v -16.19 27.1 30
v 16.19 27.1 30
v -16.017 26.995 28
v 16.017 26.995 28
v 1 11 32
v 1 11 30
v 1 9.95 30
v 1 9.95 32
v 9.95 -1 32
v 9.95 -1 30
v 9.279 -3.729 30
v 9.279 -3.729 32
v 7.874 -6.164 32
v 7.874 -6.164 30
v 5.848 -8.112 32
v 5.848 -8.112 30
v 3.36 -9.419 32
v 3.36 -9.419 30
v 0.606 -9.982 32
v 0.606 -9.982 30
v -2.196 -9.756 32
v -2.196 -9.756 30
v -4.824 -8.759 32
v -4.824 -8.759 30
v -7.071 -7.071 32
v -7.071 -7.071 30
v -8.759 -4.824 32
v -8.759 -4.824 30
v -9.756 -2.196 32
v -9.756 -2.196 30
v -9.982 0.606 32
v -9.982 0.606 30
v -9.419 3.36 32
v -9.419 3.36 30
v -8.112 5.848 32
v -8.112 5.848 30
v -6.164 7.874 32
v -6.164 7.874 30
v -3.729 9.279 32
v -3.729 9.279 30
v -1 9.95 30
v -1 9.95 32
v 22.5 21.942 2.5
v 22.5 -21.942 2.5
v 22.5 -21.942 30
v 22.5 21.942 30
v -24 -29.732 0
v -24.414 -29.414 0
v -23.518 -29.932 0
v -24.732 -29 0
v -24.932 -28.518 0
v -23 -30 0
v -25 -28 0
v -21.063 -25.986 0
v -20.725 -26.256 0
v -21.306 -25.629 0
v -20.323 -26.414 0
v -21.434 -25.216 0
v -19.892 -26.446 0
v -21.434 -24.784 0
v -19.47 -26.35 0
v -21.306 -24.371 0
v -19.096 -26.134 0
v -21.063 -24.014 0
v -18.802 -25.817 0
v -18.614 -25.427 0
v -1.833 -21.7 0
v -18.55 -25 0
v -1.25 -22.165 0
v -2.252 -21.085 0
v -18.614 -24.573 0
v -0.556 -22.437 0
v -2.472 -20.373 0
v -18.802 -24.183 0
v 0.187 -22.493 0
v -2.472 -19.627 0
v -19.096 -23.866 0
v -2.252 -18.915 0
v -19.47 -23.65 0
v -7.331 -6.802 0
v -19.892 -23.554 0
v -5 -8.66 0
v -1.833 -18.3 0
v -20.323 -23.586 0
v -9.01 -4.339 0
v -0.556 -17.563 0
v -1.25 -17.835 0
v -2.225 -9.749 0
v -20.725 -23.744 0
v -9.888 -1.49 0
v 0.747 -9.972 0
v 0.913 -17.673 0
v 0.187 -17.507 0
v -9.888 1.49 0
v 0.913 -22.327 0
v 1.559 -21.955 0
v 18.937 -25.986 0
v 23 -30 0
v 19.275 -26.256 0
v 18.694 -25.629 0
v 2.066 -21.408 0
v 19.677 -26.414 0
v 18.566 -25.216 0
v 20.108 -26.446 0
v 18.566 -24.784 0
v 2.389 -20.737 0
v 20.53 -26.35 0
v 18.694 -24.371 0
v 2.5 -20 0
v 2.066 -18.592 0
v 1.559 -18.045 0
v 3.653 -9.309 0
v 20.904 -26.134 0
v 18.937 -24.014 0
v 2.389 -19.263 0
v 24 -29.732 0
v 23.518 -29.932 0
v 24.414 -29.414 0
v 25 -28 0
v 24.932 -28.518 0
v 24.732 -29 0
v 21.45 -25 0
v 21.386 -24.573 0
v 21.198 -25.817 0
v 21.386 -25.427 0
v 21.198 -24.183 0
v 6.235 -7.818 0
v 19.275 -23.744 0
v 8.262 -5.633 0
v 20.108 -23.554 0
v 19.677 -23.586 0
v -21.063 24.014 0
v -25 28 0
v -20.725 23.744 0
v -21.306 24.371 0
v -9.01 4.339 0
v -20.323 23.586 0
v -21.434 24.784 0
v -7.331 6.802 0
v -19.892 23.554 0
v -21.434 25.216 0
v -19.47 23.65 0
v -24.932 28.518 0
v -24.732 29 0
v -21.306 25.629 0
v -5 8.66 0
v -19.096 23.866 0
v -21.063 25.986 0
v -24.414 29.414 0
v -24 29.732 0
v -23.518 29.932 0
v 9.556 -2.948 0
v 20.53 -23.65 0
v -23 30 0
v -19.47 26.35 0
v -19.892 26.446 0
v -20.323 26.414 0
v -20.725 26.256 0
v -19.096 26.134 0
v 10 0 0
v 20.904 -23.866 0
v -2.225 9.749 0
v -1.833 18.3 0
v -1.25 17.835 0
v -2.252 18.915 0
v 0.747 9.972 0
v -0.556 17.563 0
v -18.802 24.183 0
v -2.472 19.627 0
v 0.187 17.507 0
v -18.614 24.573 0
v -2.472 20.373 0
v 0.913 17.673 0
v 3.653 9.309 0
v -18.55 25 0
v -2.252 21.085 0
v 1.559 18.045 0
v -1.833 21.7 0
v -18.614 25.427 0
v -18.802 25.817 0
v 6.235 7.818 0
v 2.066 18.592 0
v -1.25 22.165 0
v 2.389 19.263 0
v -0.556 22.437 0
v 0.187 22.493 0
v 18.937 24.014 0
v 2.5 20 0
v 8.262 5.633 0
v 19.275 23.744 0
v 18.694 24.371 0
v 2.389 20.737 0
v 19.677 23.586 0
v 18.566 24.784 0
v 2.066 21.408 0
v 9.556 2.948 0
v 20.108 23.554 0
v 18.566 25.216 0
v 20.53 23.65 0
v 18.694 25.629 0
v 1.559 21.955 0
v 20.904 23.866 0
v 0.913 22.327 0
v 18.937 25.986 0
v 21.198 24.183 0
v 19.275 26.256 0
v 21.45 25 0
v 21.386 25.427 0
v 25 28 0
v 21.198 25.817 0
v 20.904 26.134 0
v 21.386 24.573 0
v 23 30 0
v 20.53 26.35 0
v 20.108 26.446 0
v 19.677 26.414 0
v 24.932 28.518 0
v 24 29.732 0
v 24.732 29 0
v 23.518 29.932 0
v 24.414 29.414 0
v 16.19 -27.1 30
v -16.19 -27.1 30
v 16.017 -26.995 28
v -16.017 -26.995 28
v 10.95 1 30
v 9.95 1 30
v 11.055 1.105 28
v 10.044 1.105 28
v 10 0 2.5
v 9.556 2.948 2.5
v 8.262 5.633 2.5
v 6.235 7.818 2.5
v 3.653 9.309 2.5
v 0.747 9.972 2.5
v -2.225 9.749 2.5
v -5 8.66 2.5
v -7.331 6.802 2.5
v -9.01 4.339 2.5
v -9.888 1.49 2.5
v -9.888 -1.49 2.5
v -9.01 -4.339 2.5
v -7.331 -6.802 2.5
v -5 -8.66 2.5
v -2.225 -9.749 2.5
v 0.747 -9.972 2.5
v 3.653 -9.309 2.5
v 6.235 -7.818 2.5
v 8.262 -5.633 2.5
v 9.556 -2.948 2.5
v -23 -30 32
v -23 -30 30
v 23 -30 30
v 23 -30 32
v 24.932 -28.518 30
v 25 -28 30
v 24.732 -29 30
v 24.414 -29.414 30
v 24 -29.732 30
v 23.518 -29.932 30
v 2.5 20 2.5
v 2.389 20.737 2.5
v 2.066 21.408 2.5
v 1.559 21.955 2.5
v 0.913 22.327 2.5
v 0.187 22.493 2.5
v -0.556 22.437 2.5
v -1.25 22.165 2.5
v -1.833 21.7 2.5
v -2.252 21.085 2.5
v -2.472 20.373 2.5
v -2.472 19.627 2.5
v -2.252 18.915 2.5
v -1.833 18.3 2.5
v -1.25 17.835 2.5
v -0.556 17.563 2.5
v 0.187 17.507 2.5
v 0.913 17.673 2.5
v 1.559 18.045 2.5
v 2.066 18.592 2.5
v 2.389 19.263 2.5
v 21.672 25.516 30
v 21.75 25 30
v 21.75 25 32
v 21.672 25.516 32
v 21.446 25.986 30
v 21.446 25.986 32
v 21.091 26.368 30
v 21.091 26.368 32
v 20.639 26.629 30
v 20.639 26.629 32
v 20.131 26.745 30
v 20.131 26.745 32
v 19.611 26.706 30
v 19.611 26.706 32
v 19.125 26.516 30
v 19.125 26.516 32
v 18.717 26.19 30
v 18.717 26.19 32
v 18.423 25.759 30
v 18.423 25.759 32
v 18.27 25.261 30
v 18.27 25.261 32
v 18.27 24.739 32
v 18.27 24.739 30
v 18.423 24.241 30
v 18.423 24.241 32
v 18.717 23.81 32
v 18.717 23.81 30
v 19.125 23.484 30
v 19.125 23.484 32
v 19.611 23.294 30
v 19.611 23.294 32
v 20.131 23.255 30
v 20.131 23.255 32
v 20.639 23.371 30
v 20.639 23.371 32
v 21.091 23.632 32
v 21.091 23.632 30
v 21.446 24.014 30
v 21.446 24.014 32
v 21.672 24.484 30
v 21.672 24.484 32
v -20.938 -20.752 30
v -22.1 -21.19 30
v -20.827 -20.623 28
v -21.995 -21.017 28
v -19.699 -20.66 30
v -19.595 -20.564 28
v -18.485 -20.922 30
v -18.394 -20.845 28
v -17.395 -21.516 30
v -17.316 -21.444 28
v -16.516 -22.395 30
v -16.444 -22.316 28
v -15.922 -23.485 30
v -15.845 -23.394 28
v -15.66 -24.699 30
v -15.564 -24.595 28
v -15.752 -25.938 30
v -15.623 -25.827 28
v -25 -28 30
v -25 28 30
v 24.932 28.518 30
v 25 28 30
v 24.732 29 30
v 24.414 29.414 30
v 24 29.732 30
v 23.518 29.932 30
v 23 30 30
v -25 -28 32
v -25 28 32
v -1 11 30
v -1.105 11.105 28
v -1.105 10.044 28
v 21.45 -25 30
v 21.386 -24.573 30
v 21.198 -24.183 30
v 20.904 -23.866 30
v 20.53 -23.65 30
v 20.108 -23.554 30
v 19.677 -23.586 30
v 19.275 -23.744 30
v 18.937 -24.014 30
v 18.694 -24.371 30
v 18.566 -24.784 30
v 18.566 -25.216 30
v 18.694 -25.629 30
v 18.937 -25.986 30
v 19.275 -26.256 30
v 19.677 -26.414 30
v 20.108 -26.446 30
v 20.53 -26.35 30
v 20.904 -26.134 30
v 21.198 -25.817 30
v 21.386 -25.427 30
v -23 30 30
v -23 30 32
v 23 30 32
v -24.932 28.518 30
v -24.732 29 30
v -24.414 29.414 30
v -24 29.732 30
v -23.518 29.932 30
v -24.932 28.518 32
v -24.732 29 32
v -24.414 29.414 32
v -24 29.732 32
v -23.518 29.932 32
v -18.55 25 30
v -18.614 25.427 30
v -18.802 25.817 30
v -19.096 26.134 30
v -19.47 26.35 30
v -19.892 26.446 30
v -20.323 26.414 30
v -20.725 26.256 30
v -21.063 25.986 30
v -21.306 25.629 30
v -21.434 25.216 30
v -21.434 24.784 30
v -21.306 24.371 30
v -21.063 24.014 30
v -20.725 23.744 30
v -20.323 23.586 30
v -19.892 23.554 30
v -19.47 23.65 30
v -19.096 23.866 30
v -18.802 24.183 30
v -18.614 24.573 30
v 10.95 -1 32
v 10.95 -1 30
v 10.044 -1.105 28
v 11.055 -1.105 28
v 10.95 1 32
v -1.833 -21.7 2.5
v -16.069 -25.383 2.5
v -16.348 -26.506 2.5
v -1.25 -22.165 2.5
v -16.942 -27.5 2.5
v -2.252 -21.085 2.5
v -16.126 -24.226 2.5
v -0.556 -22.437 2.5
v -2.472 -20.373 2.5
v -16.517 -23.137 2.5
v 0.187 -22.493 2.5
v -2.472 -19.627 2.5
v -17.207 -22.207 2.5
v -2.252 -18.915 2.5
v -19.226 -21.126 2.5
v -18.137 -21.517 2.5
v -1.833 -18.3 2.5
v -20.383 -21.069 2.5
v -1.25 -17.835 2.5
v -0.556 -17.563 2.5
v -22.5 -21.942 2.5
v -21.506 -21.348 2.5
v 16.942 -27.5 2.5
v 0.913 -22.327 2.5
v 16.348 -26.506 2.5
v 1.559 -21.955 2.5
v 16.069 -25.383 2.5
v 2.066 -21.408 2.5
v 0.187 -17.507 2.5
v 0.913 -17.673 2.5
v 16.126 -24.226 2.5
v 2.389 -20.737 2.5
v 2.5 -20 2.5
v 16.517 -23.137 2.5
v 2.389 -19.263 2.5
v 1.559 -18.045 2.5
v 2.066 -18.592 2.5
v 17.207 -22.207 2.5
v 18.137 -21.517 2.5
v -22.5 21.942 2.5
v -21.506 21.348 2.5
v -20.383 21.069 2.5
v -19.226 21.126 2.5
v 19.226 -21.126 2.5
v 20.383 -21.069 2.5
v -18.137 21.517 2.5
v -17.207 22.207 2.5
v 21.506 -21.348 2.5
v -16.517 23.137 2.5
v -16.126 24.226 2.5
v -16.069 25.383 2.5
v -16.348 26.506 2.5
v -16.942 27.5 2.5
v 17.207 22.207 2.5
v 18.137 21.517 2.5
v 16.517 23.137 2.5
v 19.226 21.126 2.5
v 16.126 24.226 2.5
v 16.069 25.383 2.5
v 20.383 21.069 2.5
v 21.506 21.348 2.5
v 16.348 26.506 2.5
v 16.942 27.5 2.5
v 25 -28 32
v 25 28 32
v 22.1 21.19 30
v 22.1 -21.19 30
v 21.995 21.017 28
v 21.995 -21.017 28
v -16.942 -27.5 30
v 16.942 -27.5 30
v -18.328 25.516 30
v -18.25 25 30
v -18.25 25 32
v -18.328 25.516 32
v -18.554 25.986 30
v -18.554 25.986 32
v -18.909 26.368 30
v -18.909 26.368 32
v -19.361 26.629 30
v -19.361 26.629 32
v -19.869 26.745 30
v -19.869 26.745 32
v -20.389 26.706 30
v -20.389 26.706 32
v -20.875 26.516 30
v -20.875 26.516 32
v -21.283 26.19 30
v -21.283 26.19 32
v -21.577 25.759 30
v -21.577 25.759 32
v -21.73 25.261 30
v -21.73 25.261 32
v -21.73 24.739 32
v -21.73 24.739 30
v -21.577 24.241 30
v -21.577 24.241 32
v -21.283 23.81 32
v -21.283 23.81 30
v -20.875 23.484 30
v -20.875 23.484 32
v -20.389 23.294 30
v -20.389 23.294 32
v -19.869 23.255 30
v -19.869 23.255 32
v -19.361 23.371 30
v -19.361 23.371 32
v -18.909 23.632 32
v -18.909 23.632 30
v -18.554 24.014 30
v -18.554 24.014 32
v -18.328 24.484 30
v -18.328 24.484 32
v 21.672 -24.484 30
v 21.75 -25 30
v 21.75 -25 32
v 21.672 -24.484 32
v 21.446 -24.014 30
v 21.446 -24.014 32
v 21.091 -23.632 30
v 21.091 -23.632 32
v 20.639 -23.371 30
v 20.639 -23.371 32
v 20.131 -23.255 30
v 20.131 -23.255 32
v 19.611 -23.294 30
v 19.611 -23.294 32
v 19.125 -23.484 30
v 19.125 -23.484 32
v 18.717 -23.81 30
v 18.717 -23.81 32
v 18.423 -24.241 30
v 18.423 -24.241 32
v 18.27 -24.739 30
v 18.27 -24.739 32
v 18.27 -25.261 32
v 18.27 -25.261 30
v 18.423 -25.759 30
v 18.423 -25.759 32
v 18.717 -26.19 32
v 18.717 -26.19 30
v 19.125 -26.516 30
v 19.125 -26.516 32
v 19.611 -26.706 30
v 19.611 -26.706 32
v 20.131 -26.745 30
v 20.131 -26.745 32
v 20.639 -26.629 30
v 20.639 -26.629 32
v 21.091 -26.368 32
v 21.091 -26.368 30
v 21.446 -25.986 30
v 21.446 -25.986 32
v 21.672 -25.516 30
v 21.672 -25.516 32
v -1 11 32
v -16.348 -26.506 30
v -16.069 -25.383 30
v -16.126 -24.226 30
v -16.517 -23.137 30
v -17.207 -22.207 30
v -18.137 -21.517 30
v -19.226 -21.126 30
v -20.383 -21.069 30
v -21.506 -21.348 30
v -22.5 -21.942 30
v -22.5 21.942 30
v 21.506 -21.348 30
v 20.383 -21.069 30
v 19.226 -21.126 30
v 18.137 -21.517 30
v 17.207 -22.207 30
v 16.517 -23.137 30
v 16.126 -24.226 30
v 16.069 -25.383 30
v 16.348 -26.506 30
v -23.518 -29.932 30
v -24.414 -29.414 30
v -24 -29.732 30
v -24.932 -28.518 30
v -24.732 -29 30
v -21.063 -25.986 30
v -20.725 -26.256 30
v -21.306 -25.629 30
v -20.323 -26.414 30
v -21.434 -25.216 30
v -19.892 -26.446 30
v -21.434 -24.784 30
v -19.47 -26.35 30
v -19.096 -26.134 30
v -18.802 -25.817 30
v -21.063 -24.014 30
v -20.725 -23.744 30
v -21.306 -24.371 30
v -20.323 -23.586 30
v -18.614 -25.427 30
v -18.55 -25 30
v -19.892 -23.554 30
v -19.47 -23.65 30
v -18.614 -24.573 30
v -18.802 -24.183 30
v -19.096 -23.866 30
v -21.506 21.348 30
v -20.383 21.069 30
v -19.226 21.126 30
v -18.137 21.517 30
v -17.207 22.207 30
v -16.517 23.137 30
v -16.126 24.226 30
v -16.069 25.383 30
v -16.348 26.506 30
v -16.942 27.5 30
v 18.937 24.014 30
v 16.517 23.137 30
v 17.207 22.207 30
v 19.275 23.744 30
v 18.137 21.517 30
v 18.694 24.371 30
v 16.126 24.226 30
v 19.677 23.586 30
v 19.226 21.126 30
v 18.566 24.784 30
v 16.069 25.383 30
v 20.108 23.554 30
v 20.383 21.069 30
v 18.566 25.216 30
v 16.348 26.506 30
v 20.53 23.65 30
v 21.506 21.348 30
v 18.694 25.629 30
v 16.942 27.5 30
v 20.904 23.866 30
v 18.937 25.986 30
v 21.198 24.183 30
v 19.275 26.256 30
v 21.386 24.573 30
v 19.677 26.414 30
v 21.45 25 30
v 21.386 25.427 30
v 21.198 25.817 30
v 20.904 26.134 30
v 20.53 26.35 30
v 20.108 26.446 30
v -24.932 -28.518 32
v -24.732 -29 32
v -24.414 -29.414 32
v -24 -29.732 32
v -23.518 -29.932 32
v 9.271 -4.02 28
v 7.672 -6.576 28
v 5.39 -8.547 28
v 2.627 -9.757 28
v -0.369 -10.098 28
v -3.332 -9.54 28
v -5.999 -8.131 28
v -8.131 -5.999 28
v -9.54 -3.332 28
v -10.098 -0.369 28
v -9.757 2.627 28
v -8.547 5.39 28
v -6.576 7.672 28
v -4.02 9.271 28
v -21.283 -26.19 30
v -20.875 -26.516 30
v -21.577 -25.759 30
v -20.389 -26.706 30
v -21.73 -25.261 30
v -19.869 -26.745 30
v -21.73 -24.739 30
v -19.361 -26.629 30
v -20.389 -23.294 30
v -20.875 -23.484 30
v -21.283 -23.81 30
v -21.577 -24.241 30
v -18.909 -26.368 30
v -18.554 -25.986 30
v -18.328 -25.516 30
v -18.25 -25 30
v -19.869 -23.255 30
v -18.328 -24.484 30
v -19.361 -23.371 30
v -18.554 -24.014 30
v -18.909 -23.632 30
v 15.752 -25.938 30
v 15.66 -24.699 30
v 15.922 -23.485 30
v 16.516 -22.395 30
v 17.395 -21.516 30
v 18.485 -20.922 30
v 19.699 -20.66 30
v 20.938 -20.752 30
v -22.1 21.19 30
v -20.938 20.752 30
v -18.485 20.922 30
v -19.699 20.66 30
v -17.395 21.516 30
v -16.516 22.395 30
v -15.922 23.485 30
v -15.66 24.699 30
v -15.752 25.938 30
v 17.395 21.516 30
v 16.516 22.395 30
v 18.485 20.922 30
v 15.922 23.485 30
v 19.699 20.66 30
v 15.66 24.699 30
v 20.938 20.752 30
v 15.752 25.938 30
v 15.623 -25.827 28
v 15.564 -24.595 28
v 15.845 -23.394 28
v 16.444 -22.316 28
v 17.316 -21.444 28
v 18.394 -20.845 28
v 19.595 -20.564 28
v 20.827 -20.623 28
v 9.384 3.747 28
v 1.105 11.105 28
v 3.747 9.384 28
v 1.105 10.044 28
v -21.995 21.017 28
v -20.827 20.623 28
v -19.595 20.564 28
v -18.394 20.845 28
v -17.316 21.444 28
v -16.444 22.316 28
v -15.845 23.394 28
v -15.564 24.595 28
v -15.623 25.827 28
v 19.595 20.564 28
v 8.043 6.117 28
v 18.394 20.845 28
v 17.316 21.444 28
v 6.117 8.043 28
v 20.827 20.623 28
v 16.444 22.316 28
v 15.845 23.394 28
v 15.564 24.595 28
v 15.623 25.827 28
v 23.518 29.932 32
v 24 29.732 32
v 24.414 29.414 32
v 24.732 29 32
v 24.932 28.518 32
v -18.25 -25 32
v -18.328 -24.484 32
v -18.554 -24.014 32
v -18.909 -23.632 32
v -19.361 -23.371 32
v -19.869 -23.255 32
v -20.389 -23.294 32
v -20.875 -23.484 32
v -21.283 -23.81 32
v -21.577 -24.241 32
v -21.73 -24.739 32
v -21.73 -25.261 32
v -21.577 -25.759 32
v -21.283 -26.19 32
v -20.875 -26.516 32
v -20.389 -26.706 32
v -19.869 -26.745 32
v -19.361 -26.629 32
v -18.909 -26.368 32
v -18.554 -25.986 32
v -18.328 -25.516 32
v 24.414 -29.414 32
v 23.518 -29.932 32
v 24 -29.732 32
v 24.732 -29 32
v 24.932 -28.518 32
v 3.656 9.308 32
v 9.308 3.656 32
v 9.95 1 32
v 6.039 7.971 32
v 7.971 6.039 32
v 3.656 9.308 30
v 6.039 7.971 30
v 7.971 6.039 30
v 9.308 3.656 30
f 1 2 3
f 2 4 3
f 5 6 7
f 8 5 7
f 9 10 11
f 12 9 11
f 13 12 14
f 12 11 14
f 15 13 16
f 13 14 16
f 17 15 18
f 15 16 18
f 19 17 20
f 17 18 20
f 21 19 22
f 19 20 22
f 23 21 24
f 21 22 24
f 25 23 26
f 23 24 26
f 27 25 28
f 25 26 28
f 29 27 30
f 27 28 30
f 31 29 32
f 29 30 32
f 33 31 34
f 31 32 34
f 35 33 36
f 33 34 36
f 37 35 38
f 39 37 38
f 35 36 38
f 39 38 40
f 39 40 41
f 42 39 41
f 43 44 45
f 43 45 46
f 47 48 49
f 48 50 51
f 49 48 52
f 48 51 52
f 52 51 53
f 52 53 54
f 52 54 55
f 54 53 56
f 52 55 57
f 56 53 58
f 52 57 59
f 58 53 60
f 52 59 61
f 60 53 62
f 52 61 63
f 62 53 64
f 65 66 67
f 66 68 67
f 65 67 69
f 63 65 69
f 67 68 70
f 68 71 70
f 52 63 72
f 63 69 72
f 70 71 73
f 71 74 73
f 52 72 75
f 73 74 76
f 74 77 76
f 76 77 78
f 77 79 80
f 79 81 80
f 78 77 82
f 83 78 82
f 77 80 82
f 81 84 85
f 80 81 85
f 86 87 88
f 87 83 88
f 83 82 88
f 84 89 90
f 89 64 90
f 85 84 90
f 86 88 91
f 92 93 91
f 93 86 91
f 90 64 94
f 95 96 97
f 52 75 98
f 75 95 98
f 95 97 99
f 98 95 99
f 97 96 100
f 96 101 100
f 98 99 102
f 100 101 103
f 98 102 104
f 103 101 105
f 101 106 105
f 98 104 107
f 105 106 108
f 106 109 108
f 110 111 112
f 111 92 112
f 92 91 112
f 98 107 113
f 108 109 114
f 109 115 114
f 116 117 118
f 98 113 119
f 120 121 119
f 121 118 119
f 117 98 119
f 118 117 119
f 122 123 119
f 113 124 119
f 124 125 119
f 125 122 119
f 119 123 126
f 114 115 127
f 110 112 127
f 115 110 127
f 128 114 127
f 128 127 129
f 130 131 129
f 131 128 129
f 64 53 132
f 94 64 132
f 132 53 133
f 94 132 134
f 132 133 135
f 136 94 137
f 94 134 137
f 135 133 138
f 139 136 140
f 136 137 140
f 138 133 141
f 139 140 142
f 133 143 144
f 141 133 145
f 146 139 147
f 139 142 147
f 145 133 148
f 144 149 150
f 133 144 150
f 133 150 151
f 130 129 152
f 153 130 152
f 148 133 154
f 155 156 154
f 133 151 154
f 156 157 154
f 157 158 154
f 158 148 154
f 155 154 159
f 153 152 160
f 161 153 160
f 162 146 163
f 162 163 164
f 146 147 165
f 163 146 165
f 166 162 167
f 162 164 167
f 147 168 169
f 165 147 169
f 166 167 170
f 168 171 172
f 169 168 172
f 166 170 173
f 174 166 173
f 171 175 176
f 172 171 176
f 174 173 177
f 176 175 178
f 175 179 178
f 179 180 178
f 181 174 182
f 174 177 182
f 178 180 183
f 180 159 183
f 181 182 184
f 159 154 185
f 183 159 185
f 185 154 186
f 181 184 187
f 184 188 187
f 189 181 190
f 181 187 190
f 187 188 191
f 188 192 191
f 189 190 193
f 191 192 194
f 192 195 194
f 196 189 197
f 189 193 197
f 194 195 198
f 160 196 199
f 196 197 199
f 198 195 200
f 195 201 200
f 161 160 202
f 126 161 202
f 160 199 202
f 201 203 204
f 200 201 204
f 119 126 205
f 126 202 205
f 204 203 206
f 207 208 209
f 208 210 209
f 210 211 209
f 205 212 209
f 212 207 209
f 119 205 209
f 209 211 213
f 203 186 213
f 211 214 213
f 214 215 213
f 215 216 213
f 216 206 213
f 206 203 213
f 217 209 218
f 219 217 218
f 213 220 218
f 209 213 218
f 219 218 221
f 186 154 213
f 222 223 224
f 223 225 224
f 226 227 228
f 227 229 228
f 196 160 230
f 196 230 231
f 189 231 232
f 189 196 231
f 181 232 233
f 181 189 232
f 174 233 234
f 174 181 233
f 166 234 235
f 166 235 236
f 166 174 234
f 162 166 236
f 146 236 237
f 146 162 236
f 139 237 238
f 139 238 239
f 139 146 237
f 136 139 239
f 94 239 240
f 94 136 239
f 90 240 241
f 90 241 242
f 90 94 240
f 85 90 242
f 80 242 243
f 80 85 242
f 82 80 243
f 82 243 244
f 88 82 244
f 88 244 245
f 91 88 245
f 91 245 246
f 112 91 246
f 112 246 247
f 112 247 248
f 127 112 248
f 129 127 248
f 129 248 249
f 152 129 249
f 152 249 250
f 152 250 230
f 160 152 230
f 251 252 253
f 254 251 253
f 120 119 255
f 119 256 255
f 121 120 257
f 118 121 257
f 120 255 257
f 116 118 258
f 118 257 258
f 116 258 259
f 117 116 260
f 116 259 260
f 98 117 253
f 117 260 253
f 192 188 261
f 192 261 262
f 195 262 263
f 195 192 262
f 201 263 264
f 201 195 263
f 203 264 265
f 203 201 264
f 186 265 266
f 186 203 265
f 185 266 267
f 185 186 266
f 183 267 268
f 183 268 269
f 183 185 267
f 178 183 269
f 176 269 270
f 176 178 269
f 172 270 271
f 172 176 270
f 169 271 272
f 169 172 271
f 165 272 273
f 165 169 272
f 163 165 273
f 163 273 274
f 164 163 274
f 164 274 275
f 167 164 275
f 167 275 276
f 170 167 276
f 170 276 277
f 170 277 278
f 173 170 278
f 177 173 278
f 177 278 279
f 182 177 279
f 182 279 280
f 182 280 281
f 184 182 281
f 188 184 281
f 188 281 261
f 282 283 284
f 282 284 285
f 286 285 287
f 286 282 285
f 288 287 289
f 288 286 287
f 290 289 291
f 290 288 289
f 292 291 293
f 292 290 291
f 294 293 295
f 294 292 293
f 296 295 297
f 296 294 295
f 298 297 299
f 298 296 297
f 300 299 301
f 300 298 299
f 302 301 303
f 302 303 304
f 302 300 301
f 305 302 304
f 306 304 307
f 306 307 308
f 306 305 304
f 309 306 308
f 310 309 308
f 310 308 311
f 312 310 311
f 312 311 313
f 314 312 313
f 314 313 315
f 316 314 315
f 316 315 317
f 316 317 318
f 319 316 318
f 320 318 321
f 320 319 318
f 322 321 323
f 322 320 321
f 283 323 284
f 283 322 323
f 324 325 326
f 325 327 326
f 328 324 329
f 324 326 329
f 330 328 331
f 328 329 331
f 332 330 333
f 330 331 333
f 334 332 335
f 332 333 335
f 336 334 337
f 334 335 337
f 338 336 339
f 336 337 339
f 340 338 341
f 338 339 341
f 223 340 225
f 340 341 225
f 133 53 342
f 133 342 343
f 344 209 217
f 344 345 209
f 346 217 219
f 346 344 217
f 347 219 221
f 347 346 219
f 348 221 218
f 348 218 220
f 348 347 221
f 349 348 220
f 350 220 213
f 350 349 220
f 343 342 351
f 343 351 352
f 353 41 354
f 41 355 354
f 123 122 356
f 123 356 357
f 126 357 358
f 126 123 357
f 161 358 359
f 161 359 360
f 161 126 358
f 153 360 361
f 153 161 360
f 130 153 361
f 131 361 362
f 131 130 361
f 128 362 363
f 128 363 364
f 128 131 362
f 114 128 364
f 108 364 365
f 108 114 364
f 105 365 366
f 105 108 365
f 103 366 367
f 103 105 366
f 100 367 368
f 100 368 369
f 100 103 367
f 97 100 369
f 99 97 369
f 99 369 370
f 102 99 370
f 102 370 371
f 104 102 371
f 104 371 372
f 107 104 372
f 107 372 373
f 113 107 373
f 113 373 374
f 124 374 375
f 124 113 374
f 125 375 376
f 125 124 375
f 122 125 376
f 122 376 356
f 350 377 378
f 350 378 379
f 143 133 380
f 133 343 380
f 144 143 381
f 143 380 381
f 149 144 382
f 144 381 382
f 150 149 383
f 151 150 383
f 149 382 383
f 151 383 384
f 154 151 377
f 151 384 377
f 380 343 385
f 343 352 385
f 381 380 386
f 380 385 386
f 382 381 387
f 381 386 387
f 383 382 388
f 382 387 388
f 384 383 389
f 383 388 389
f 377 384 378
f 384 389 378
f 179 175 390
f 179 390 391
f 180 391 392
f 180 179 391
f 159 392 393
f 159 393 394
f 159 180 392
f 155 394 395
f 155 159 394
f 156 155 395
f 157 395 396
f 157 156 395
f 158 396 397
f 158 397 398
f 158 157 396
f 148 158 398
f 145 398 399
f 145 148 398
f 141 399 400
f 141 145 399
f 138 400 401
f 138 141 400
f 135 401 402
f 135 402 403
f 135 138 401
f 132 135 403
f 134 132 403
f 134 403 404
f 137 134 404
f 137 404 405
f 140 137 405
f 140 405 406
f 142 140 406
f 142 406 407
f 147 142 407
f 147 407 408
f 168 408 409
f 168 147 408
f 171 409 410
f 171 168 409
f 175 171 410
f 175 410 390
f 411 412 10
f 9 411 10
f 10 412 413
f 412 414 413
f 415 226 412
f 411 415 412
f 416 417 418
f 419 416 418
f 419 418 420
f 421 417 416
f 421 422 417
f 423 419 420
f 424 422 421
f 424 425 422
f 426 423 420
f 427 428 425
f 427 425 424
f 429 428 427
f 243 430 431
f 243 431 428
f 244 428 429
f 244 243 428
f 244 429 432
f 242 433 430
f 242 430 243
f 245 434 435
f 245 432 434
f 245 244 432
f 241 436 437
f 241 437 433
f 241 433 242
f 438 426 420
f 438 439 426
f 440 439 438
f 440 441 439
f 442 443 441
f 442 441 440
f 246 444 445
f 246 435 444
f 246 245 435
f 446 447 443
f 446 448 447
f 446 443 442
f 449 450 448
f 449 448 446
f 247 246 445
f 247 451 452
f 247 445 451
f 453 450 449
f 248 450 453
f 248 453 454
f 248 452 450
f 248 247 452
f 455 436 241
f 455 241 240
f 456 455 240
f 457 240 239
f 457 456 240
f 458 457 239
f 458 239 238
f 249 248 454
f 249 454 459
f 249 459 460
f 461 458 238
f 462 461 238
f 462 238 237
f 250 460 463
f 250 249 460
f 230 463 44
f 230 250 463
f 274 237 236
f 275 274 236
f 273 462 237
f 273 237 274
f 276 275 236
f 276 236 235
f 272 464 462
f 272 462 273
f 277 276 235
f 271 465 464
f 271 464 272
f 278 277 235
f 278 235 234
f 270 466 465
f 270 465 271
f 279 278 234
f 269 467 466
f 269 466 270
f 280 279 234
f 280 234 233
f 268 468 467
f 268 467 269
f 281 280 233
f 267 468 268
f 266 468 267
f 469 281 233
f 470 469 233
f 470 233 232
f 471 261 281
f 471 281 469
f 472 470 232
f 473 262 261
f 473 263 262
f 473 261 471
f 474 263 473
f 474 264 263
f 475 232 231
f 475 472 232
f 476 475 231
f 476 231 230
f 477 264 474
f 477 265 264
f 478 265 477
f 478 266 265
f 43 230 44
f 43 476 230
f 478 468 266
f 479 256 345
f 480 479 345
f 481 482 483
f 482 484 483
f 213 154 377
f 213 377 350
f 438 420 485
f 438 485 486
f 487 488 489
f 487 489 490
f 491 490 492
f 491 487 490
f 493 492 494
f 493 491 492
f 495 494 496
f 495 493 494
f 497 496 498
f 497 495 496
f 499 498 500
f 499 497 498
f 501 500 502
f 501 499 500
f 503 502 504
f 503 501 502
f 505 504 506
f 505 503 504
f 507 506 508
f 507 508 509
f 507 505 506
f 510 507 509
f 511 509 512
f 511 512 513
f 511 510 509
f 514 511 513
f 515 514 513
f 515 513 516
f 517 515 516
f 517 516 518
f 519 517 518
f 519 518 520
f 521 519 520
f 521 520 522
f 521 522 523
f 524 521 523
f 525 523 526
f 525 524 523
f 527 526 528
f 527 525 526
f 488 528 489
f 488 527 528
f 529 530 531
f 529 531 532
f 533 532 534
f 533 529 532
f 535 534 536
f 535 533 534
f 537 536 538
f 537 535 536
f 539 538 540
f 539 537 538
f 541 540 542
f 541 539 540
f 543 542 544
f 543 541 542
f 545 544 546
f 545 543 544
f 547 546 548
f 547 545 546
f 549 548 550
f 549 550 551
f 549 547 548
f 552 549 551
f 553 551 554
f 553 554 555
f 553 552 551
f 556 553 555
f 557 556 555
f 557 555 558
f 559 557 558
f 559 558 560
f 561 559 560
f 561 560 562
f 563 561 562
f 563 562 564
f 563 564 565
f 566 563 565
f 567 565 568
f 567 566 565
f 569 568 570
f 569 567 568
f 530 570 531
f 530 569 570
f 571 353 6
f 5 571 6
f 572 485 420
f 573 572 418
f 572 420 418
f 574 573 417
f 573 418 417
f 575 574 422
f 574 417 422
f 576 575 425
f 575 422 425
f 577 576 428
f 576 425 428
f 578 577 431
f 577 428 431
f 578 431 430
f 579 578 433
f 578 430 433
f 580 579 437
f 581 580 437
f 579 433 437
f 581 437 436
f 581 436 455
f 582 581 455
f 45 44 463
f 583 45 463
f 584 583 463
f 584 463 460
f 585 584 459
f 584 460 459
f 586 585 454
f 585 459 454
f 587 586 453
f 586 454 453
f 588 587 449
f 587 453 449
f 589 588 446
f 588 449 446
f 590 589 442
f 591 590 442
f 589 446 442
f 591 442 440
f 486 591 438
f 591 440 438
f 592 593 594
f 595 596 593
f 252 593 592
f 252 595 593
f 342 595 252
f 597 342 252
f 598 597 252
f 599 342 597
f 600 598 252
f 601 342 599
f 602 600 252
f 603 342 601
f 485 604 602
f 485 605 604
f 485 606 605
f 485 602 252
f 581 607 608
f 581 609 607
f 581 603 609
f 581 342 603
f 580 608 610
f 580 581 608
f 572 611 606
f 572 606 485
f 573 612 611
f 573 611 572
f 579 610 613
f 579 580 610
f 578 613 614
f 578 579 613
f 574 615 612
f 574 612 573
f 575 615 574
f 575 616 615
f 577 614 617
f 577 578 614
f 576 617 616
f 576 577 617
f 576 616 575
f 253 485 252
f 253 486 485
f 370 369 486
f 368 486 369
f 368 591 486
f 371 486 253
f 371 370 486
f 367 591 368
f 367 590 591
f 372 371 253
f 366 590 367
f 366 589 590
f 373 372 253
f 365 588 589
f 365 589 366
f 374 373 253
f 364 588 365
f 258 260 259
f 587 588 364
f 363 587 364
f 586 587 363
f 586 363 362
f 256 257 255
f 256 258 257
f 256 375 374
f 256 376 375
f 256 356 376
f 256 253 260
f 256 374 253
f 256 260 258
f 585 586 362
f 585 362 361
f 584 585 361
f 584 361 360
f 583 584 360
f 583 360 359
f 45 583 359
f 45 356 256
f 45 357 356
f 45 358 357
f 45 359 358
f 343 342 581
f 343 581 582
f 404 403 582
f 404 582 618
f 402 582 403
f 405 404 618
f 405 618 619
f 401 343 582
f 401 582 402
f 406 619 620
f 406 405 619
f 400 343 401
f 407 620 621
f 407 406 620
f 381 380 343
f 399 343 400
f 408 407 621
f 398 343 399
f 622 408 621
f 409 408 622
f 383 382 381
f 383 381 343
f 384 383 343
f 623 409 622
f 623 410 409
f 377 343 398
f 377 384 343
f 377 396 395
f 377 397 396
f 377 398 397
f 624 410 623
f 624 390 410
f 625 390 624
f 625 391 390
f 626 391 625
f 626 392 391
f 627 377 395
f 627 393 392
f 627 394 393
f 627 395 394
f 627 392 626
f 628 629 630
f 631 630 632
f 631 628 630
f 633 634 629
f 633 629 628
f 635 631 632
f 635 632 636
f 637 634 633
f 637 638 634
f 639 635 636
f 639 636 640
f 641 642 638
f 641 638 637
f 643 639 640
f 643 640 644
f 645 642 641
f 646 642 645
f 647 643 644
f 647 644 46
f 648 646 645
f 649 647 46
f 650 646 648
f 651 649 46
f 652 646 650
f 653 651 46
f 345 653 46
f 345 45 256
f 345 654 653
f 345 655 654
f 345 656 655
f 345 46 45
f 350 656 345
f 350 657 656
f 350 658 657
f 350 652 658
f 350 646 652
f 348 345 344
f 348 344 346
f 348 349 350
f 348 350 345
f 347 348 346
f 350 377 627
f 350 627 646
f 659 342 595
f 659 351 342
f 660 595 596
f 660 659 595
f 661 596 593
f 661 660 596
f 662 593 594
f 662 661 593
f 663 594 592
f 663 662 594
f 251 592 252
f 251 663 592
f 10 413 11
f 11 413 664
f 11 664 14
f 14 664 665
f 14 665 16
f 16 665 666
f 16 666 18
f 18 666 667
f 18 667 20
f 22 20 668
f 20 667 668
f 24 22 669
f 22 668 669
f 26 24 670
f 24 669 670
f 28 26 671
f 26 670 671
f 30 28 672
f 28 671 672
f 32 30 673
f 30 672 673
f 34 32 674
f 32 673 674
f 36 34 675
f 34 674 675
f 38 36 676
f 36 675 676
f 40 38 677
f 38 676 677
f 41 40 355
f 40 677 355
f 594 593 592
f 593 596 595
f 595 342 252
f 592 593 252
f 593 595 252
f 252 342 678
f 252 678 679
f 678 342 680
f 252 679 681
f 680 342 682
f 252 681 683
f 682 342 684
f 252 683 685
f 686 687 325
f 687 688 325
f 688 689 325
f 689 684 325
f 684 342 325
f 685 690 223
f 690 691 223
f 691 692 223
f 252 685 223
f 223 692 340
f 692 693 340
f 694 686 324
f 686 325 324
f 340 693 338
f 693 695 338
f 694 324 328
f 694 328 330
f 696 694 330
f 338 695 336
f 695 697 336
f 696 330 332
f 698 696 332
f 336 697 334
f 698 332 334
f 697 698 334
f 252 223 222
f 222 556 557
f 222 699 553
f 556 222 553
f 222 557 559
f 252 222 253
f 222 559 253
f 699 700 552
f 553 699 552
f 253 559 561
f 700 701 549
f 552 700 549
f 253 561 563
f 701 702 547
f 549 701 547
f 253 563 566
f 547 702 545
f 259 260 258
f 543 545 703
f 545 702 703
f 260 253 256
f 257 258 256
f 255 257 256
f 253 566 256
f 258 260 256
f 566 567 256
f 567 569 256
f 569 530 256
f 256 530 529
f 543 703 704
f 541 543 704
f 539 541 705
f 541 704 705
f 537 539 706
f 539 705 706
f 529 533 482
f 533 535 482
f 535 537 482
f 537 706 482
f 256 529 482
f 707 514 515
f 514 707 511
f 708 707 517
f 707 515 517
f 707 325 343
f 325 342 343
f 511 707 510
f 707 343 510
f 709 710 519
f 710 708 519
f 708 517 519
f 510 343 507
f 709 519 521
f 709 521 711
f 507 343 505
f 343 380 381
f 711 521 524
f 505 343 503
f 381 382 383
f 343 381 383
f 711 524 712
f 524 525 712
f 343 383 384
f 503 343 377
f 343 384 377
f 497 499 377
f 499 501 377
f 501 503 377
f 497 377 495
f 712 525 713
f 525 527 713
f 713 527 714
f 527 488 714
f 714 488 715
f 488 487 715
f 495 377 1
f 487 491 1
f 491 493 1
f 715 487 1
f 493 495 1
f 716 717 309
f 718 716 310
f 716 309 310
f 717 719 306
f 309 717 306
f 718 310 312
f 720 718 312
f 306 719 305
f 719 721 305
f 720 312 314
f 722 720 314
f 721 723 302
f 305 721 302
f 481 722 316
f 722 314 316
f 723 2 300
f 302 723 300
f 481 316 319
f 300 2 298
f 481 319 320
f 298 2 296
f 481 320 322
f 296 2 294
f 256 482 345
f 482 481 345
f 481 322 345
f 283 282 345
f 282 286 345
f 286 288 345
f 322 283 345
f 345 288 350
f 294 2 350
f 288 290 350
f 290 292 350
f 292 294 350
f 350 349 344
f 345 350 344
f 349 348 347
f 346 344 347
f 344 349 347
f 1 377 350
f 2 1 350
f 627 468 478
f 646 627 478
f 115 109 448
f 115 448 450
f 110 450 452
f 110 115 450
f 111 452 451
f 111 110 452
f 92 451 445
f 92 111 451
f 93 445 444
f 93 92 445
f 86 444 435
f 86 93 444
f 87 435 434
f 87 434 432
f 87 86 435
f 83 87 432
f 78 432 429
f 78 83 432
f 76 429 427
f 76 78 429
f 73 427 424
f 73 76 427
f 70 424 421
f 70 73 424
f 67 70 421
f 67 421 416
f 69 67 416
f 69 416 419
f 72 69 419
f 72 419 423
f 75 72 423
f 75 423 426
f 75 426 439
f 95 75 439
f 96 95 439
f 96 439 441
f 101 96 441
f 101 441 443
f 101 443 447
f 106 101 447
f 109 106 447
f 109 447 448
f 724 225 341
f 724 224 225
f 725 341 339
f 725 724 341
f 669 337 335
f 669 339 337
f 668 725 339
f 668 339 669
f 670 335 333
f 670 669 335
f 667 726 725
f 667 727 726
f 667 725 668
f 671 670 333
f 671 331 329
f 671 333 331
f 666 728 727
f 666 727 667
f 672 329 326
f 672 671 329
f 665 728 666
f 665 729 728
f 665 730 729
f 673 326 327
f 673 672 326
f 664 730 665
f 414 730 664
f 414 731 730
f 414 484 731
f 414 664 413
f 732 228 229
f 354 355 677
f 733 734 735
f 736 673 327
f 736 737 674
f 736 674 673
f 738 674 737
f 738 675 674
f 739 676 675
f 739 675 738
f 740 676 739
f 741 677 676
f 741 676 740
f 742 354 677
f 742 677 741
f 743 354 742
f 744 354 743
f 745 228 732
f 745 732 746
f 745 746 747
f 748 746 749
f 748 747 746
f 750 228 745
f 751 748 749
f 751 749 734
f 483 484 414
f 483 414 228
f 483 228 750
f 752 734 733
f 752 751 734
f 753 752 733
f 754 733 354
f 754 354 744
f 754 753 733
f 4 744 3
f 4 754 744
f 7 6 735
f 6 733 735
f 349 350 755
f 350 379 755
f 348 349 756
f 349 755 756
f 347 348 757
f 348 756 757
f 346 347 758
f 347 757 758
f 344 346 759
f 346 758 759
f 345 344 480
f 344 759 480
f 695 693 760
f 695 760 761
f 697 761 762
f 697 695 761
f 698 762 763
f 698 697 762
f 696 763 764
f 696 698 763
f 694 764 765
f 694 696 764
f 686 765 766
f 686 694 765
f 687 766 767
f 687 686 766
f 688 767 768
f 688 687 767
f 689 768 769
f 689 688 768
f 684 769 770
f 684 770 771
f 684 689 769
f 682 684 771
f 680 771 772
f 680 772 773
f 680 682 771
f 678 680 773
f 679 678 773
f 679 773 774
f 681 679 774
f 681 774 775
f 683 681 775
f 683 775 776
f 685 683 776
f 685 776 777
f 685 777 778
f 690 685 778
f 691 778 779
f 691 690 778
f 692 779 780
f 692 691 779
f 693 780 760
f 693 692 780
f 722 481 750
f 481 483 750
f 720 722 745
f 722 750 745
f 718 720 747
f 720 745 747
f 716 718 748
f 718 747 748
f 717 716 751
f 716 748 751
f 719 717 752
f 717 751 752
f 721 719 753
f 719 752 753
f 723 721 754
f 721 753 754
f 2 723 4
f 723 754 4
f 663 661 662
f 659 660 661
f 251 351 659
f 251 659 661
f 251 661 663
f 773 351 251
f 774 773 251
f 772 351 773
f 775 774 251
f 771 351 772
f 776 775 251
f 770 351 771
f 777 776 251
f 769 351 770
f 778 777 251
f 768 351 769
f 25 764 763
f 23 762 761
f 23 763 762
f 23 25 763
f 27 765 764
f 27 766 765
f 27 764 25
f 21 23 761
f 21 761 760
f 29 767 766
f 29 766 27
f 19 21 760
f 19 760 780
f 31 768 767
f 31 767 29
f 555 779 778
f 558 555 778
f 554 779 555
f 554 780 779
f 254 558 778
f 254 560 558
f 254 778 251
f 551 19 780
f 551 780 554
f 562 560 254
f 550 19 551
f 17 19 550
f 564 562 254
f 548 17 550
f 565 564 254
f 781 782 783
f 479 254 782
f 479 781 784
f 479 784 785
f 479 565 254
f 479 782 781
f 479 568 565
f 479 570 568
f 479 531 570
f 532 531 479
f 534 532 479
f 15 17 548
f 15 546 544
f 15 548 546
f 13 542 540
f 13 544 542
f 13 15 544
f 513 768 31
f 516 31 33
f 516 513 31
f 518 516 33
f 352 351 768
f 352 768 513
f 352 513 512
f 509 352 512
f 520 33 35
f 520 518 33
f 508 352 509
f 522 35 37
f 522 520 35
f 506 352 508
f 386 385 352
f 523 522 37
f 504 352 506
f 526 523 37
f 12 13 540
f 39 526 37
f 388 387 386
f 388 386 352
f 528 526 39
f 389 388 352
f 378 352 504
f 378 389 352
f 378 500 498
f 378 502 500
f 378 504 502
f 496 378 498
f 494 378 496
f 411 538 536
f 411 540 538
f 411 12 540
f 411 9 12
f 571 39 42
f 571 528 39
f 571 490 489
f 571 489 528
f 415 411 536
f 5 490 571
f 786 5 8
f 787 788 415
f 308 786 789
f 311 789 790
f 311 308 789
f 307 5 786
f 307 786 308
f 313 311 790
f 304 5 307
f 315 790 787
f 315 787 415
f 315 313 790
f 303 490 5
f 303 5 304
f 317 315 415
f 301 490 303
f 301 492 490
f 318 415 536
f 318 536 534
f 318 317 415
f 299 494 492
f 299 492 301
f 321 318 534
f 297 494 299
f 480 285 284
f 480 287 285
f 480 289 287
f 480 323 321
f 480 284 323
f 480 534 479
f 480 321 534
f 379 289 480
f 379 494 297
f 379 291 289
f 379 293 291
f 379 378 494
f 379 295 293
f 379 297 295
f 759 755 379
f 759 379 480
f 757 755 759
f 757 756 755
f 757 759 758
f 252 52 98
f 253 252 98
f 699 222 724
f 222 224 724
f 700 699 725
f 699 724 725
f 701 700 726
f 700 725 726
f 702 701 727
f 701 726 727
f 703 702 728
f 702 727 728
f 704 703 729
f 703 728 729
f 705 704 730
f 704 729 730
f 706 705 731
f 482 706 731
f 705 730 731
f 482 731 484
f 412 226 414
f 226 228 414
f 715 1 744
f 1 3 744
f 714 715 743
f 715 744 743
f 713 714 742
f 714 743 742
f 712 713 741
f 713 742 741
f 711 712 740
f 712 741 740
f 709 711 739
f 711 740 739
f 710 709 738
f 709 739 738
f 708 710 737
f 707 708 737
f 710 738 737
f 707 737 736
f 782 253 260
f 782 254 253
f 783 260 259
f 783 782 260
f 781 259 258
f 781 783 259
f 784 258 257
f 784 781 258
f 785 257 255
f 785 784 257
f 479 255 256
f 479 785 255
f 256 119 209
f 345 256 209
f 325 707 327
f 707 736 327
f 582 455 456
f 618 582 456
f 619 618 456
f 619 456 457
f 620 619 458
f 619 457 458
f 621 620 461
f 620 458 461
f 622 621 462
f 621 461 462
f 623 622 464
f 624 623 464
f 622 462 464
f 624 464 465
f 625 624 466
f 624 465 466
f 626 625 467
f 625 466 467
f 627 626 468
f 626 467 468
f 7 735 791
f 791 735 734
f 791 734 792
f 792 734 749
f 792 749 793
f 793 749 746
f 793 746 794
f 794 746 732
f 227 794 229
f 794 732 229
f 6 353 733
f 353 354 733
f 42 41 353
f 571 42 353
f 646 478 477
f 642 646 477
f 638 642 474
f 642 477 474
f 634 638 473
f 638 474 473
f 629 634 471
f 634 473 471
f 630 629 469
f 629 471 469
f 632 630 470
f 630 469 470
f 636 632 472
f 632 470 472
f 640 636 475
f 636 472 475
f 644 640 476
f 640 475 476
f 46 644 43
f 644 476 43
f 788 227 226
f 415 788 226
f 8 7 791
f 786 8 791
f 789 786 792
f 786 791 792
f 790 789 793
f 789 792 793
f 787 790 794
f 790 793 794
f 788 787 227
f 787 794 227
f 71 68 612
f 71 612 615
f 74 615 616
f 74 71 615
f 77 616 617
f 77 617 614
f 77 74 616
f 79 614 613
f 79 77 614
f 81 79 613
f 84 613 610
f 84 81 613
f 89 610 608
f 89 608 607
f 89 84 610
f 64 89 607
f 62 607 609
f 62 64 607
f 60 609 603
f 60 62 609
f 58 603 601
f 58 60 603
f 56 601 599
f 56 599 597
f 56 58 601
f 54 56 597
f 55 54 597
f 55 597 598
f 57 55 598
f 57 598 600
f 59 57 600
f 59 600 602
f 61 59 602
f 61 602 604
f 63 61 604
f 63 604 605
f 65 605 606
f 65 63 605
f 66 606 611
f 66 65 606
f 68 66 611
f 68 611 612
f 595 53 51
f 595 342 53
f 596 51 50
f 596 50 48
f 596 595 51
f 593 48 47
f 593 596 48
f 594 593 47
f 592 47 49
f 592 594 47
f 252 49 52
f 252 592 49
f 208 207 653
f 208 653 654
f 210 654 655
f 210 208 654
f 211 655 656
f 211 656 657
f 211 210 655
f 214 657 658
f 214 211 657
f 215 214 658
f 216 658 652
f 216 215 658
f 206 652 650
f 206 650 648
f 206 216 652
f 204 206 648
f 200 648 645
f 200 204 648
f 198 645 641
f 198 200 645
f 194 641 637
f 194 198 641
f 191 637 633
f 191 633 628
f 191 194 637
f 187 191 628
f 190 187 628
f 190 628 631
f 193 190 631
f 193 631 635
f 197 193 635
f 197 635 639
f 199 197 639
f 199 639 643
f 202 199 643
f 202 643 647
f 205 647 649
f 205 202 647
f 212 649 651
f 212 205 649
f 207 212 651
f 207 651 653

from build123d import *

# Parameters (mm, degrees)
F0_W     = 50
F0_H     = 60
F0_R     = 1.45
F0_R_2   = 2.5
F0_R_3   = 10
F1_DEPTH = 30
F2_T     = -2.5
F4_DEPTH = 2
F4_TAPER = 3
F3_W     = 50
F3_H     = 60
F3_R     = 1.75
F5_DEPTH = 2
F6_R     = 2
F6_2_R   = 2


with BuildPart() as f1:
    # F0 (on Top) → F1 (new body)
    with BuildSketch(Plane.XY):
        Rectangle(F0_W, F0_H)
        with Locations((-20, -25)):
            Circle(F0_R, mode=Mode.SUBTRACT)
        with Locations((0, -20)):
            Circle(F0_R_2, mode=Mode.SUBTRACT)
        with Locations((20, -25)):
            Circle(F0_R, mode=Mode.SUBTRACT)
        with Locations((-20, 25)):
            Circle(F0_R, mode=Mode.SUBTRACT)
        Circle(F0_R_3, mode=Mode.SUBTRACT)
        with Locations((0, 20)):
            Circle(F0_R_2, mode=Mode.SUBTRACT)
        with Locations((20, 25)):
            Circle(F0_R, mode=Mode.SUBTRACT)
    extrude(amount=F1_DEPTH)

    # F2
    f2_openings = [f1.faces().sort_by_distance(p)[0] for p in [
        (-10, 0, 15),
        (0, -29.218975, 30),
        (-2.5, 20, 15),
        (-2.5, -20, 15),
    ]]
    offset(amount=F2_T, openings=f2_openings)

    # F6
    f6_edges = [f1.edges().sort_by_distance(p)[0] for p in [
        (25, 30, 15),
        (25, -30, 15),
        (-25, 30, 15),
        (-25, -30, 15),
    ]]
    fillet(f6_edges, radius=F6_R)


with BuildPart() as f4:
    # F3 (on face) → F4 (new body)
    with BuildSketch(Plane.XY.offset(30)):
        with BuildLine():
            ThreePointArc((-22.1, -21.1904724702), (-16.9240855018, -21.9240855018), (-16.1904724702, -27.1))
            Line((-16.1904724702, -27.1), (16.1904724702, -27.1))
            ThreePointArc((16.1904724702, -27.1), (16.9240855018, -21.9240855018), (22.1, -21.1904724702))
            Line((22.1, -21.1904724702), (22.1, 21.1904724702))
            ThreePointArc((22.1, 21.1904724702), (16.9240855018, 21.9240855018), (16.1904724702, 27.1))
            Line((16.1904724702, 27.1), (-16.1904724702, 27.1))
            ThreePointArc((-16.1904724702, 27.1), (-16.9240855018, 21.9240855018), (-22.1, 21.1904724702))
            Line((-22.1, 21.1904724702), (-22.1, -21.1904724702))
        make_face()
        with BuildLine():
            ThreePointArc((9.9498743711, -1), (-7.0710678119, -7.0710678119), (-1, 9.9498743711))
            Line((-1, 9.9498743711), (-1, 11))
            Line((-1, 11), (1, 11))
            Line((1, 11), (1, 9.9498743711))
            ThreePointArc((1, 9.9498743711), (7.0710678119, 7.0710678119), (9.9498743711, 1))
            Line((9.9498743711, 1), (10.9498743711, 1))
            Line((10.9498743711, 1), (10.9498743711, -1))
            Line((10.9498743711, -1), (9.9498743711, -1))
        make_face(mode=Mode.SUBTRACT)
    extrude(amount=-F4_DEPTH, taper=F4_TAPER)

    # F3 (on face) → F5 (join)
    with BuildSketch(Plane.XY.offset(30)):
        Rectangle(F3_W, F3_H)
        with Locations((-20, -25)):
            Circle(F3_R, mode=Mode.SUBTRACT)
        with Locations((20, -25)):
            Circle(F3_R, mode=Mode.SUBTRACT)
        with Locations((-20, 25)):
            Circle(F3_R, mode=Mode.SUBTRACT)
        with BuildLine():
            ThreePointArc((-16.05, -25), (-18.3077381999, -21.4308614485), (-22.5, -21.9418142633))
            Line((-22.5, -21.9418142633), (-22.5, 21.9418142633))
            ThreePointArc((-22.5, 21.9418142633), (-18.3077381999, 21.4308614485), (-16.05, 25))
            ThreePointArc((-16.05, 25), (-16.2796281328, 26.3271522784), (-16.9418142633, 27.5))
            Line((-16.9418142633, 27.5), (16.9418142633, 27.5))
            ThreePointArc((16.9418142633, 27.5), (17.2069282143, 22.2069282143), (22.5, 21.9418142633))
            Line((22.5, 21.9418142633), (22.5, -21.9418142633))
            ThreePointArc((22.5, -21.9418142633), (17.2069282143, -22.2069282143), (16.9418142633, -27.5))
            Line((16.9418142633, -27.5), (-16.9418142633, -27.5))
            ThreePointArc((-16.9418142633, -27.5), (-16.2796281328, -26.3271522784), (-16.05, -25))
        make_face(mode=Mode.SUBTRACT)
        with Locations((20, 25)):
            Circle(F3_R, mode=Mode.SUBTRACT)
        with BuildLine():
            Line((-22.5, 21.9418142633), (-22.5, -21.9418142633))
            ThreePointArc((-22.5, -21.9418142633), (-18.3077381999, -21.4308614485), (-16.05, -25))
            ThreePointArc((-16.05, -25), (-16.2796281328, -26.3271522784), (-16.9418142633, -27.5))
            Line((-16.9418142633, -27.5), (16.9418142633, -27.5))
            ThreePointArc((16.9418142633, -27.5), (17.2069282143, -22.2069282143), (22.5, -21.9418142633))
            Line((22.5, -21.9418142633), (22.5, 21.9418142633))
            ThreePointArc((22.5, 21.9418142633), (17.2069282143, 22.2069282143), (16.9418142633, 27.5))
            Line((16.9418142633, 27.5), (-16.9418142633, 27.5))
            ThreePointArc((-16.9418142633, 27.5), (-16.2796281328, 26.3271522784), (-16.05, 25))
            ThreePointArc((-16.05, 25), (-18.3077381999, 21.4308614485), (-22.5, 21.9418142633))
        make_face()
        with BuildLine():
            Line((16.1904724702, -27.1), (-16.1904724702, -27.1))
            ThreePointArc((-16.1904724702, -27.1), (-16.9240855018, -21.9240855018), (-22.1, -21.1904724702))
            Line((-22.1, -21.1904724702), (-22.1, 21.1904724702))
            ThreePointArc((-22.1, 21.1904724702), (-16.9240855018, 21.9240855018), (-16.1904724702, 27.1))
            Line((-16.1904724702, 27.1), (16.1904724702, 27.1))
            ThreePointArc((16.1904724702, 27.1), (16.9240855018, 21.9240855018), (22.1, 21.1904724702))
            Line((22.1, 21.1904724702), (22.1, -21.1904724702))
            ThreePointArc((22.1, -21.1904724702), (16.9240855018, -21.9240855018), (16.1904724702, -27.1))
        make_face(mode=Mode.SUBTRACT)
        with BuildLine():
            ThreePointArc((-22.1, -21.1904724702), (-16.9240855018, -21.9240855018), (-16.1904724702, -27.1))
            Line((-16.1904724702, -27.1), (16.1904724702, -27.1))
            ThreePointArc((16.1904724702, -27.1), (16.9240855018, -21.9240855018), (22.1, -21.1904724702))
            Line((22.1, -21.1904724702), (22.1, 21.1904724702))
            ThreePointArc((22.1, 21.1904724702), (16.9240855018, 21.9240855018), (16.1904724702, 27.1))
            Line((16.1904724702, 27.1), (-16.1904724702, 27.1))
            ThreePointArc((-16.1904724702, 27.1), (-16.9240855018, 21.9240855018), (-22.1, 21.1904724702))
            Line((-22.1, 21.1904724702), (-22.1, -21.1904724702))
        make_face()
        with BuildLine():
            ThreePointArc((9.9498743711, -1), (-7.0710678119, -7.0710678119), (-1, 9.9498743711))
            Line((-1, 9.9498743711), (-1, 11))
            Line((-1, 11), (1, 11))
            Line((1, 11), (1, 9.9498743711))
            ThreePointArc((1, 9.9498743711), (7.0710678119, 7.0710678119), (9.9498743711, 1))
            Line((9.9498743711, 1), (10.9498743711, 1))
            Line((10.9498743711, 1), (10.9498743711, -1))
            Line((10.9498743711, -1), (9.9498743711, -1))
        make_face(mode=Mode.SUBTRACT)
    extrude(amount=F5_DEPTH)

    # F6#2
    f6_2_edges = [f4.edges().sort_by_distance(p)[0] for p in [
        (25, 30, 31),
        (25, -30, 31),
        (-25, 30, 31),
        (-25, -30, 31),
    ]]
    fillet(f6_2_edges, radius=F6_2_R)


solid = Compound([f1.part, f4.part])
